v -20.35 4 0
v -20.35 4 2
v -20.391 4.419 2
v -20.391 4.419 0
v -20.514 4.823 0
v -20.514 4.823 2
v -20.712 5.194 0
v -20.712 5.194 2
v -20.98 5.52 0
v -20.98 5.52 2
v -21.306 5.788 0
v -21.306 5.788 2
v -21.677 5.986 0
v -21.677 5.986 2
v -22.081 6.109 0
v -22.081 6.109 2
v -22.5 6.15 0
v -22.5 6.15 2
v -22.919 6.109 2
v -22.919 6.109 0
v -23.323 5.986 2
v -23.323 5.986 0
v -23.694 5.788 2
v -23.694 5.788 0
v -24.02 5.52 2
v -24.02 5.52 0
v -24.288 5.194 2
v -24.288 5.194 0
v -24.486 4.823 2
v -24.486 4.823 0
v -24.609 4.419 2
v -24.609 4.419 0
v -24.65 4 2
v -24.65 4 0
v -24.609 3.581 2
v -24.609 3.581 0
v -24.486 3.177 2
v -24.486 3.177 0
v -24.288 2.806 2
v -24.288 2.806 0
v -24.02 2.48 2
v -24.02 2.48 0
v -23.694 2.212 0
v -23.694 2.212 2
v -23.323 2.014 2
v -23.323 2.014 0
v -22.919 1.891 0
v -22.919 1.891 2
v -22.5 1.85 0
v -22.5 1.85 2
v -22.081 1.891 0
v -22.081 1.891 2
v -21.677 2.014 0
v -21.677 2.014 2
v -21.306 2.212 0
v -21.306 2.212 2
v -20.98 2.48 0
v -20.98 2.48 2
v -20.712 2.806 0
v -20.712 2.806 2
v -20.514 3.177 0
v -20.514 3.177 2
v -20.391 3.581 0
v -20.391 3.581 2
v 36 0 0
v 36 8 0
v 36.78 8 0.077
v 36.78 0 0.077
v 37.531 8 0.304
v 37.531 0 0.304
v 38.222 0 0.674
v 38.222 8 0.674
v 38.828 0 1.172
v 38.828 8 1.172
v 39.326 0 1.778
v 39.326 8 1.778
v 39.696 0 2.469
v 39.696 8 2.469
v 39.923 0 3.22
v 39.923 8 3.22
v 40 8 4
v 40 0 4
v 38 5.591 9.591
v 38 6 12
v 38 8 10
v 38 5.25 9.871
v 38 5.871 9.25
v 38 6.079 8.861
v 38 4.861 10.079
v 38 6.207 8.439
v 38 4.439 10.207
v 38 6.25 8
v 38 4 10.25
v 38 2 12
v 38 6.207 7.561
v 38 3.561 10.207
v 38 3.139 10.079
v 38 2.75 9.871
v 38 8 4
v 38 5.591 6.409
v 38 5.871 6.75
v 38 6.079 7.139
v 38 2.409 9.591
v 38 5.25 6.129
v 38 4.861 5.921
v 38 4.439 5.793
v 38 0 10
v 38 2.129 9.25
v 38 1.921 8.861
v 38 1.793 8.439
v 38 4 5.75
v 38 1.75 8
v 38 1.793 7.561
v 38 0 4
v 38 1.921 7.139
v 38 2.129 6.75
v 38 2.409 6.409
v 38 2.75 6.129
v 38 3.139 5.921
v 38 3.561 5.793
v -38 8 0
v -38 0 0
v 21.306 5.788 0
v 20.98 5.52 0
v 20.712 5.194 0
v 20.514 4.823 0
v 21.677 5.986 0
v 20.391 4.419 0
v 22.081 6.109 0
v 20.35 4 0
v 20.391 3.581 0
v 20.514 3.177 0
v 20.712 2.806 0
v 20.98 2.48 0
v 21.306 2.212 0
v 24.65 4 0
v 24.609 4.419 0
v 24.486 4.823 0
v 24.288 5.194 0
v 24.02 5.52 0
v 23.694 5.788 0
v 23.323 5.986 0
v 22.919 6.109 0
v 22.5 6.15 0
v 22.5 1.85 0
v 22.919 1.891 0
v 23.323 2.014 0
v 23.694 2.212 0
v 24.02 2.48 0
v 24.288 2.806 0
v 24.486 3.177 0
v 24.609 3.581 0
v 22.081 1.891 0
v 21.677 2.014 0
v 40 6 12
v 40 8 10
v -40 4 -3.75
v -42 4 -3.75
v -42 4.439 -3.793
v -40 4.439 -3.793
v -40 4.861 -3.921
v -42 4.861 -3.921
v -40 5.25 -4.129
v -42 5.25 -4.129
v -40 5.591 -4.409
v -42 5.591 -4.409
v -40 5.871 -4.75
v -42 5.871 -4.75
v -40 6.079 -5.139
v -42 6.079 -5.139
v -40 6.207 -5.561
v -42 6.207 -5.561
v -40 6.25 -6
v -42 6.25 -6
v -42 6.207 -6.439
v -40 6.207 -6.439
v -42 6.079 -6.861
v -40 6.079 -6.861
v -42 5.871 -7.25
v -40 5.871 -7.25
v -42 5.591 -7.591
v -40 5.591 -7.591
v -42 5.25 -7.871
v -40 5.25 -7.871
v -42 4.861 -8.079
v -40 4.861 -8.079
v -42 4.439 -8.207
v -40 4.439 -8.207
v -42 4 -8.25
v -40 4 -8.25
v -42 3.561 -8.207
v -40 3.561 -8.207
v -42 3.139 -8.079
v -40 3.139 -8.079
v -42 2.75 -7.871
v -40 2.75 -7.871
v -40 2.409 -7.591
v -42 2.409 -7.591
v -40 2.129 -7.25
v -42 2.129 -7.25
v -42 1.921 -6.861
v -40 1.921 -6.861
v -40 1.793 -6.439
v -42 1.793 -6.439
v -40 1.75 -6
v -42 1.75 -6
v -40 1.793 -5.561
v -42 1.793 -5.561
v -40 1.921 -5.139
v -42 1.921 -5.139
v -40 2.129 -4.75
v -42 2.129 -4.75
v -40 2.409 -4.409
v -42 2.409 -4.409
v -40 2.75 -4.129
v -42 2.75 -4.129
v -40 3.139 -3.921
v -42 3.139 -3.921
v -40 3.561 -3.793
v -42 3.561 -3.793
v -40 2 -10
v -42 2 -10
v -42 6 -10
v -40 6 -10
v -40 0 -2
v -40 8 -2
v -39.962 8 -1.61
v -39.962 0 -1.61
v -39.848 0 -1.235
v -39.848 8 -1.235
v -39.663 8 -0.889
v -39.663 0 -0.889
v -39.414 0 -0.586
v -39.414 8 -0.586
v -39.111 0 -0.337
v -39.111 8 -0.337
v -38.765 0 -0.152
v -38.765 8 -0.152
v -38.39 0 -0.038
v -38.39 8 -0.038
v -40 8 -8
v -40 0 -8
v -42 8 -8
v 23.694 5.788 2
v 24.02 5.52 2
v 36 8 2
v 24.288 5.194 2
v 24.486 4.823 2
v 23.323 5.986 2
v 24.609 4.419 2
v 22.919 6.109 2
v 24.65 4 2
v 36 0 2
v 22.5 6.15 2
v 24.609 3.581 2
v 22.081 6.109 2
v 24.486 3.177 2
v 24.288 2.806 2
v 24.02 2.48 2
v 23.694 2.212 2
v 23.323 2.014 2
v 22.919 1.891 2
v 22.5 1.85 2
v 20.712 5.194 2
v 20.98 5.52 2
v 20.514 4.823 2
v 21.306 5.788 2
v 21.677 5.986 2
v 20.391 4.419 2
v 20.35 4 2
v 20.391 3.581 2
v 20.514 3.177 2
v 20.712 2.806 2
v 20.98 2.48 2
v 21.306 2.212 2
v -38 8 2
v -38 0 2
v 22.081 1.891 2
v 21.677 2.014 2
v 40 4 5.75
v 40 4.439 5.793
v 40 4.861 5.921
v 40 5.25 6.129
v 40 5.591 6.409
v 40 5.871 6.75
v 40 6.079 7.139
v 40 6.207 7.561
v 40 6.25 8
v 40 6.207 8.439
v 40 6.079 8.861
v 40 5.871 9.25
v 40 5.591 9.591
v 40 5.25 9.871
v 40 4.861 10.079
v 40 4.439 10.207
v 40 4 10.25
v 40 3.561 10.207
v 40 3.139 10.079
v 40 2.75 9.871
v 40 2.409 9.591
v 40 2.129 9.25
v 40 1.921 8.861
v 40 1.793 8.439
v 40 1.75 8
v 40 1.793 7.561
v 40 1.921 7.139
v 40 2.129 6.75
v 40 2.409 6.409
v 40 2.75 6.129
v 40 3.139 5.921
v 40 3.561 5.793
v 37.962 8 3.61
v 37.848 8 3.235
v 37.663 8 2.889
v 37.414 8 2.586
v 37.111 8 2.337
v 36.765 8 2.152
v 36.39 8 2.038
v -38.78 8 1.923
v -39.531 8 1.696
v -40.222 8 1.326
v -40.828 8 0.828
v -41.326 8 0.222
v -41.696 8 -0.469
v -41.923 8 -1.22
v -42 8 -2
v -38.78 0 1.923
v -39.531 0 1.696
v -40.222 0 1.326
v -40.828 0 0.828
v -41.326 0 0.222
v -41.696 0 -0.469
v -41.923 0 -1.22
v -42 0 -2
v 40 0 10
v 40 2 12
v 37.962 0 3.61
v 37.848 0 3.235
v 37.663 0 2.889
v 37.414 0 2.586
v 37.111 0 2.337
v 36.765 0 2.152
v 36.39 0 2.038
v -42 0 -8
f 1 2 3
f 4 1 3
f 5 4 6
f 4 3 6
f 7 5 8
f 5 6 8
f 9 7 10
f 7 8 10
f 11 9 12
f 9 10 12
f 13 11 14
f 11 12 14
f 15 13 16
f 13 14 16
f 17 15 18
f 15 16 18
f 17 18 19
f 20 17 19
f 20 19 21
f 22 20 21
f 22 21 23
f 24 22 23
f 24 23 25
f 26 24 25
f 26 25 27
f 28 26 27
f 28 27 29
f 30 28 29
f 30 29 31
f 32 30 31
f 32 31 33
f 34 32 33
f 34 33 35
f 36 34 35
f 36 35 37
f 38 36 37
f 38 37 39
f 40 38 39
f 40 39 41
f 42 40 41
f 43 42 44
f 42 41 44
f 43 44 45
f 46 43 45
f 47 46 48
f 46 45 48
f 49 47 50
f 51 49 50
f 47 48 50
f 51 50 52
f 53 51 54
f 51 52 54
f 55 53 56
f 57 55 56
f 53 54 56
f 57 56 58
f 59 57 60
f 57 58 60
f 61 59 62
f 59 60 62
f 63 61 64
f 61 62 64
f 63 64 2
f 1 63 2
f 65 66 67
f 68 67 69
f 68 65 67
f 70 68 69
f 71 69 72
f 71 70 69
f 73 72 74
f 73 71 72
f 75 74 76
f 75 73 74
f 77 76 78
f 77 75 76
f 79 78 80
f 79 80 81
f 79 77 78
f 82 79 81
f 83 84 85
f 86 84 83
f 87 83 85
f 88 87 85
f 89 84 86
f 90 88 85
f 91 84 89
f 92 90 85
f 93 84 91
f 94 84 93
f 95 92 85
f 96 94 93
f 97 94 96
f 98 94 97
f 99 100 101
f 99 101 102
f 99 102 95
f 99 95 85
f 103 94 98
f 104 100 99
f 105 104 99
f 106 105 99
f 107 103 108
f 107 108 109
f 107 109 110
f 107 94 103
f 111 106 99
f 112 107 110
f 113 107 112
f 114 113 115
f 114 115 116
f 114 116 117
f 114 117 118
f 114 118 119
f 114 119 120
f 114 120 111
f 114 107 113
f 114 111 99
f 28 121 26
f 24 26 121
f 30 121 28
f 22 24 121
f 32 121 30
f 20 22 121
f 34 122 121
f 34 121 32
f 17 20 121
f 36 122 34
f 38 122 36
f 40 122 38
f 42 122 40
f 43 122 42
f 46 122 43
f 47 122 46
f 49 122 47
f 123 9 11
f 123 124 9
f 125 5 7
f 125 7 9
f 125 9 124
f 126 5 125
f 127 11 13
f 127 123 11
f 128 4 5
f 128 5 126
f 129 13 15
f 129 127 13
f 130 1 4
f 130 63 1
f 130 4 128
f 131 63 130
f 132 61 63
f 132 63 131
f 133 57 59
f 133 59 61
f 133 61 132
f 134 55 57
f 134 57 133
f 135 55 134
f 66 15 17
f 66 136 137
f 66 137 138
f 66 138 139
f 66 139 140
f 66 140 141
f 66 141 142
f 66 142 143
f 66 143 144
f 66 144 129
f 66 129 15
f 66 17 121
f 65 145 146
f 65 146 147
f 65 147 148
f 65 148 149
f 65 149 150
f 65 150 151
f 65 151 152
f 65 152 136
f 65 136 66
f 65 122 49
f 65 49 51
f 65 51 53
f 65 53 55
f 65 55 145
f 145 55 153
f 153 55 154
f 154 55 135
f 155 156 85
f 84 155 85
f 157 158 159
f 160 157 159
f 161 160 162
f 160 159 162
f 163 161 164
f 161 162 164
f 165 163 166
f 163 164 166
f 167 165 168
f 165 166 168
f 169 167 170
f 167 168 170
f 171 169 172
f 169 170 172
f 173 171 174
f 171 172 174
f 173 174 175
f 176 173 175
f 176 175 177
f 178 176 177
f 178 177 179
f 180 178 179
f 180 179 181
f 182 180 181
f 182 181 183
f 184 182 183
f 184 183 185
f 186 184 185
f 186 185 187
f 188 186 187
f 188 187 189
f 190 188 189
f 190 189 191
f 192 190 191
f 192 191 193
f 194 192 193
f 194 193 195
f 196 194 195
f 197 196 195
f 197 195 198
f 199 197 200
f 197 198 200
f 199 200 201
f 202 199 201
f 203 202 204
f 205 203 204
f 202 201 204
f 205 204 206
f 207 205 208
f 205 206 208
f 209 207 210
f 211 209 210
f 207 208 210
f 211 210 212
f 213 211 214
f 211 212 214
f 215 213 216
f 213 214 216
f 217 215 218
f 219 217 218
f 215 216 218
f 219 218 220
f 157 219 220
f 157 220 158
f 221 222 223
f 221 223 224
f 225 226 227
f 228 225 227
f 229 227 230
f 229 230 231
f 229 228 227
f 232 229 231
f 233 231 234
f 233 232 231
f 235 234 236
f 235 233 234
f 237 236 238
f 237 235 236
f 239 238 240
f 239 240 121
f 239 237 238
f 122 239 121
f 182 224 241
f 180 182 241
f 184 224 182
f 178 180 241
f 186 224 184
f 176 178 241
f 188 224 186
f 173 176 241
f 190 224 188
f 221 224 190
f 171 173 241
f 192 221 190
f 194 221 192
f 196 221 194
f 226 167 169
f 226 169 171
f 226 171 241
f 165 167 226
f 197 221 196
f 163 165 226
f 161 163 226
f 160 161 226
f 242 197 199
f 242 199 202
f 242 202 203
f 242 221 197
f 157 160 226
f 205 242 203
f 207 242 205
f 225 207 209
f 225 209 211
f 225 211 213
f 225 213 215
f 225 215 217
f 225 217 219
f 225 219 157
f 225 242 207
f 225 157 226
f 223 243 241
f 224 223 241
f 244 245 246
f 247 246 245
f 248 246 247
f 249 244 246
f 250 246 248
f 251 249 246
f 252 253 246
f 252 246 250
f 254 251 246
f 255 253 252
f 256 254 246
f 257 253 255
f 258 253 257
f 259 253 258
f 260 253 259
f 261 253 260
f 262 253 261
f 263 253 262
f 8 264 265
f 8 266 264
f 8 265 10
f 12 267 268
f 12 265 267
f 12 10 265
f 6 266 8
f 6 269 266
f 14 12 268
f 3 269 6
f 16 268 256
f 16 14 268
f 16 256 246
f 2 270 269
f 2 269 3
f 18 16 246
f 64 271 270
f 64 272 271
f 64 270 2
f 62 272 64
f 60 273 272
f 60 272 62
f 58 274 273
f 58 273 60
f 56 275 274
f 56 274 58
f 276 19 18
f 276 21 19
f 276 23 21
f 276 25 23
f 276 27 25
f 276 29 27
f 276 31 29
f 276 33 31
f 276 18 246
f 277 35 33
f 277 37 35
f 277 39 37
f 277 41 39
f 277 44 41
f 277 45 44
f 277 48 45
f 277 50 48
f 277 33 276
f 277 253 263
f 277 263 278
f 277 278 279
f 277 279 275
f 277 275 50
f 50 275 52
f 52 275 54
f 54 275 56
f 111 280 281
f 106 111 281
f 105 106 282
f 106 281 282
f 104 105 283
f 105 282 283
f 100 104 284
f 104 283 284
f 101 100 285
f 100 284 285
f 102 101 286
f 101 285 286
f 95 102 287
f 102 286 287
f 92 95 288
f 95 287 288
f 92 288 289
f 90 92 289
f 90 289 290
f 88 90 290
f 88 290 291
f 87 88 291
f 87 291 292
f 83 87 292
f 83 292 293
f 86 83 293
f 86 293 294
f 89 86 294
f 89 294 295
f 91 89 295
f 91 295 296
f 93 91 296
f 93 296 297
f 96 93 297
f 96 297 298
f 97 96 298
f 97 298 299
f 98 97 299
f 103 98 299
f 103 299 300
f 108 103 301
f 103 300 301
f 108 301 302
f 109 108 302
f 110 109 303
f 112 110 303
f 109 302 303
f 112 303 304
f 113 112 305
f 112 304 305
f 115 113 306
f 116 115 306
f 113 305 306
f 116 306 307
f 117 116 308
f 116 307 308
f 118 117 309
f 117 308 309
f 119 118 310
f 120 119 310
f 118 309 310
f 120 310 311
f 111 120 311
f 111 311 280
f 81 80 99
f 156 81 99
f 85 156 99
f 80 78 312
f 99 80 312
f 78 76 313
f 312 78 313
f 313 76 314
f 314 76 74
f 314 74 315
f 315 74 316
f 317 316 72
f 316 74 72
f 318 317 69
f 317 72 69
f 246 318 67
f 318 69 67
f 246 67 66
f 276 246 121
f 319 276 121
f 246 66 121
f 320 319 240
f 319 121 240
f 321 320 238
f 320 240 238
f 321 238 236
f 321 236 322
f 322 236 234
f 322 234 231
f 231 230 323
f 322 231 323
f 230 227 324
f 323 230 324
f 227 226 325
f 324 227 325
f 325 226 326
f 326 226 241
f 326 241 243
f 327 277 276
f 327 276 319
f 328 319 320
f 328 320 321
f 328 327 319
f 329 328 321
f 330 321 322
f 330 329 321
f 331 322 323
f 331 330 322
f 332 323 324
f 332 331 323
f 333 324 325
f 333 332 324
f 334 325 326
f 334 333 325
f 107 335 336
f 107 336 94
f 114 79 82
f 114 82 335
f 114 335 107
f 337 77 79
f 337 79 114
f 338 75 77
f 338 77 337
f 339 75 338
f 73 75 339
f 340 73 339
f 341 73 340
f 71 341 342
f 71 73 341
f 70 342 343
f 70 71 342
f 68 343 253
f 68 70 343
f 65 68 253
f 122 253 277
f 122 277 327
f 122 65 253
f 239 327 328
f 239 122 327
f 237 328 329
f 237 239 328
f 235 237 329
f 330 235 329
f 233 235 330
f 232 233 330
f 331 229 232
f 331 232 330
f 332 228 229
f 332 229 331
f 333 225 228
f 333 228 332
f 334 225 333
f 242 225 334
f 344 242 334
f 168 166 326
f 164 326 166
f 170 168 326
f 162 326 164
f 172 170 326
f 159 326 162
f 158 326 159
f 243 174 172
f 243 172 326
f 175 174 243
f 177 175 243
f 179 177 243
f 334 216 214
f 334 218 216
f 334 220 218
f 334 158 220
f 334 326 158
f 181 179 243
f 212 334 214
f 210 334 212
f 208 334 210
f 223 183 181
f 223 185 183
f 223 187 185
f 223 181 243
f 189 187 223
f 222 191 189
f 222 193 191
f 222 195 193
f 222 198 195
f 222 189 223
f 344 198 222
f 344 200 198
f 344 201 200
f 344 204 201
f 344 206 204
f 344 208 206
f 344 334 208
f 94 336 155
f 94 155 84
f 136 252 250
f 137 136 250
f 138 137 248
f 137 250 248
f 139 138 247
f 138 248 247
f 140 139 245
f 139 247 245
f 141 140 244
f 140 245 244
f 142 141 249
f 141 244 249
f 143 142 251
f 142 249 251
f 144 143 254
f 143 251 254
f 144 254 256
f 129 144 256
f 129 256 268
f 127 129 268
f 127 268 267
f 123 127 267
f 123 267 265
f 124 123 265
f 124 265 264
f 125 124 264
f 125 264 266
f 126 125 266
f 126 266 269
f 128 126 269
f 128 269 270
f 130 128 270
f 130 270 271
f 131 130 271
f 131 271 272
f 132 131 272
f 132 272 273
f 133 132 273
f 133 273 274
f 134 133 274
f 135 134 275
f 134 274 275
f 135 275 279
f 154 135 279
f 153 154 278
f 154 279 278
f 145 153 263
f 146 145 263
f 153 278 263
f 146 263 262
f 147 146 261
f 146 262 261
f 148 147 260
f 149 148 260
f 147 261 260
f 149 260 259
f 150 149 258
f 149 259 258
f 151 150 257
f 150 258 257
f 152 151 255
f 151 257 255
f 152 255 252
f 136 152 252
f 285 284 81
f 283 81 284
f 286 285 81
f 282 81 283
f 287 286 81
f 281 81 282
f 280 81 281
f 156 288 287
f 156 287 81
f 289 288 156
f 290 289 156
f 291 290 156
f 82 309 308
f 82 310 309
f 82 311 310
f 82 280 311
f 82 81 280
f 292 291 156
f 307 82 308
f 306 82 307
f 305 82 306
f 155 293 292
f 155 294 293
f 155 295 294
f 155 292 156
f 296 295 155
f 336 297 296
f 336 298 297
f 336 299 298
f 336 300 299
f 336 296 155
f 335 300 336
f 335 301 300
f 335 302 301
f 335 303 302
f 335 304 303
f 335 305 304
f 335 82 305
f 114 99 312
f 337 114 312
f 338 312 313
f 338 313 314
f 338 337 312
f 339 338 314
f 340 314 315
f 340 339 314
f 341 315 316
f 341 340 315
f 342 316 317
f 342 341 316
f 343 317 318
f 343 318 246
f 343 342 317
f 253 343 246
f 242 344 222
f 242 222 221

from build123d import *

# Parameters (mm, degrees)
SM_BASE_FLANGE_1_DEPTH = 8
SKETCH_6_R             = 2.15
CUT_EXTRUDE_1_DEPTH    = 45.407206622
CHAMFER_1_SIZE         = 2
SKETCH_7_R             = 2.25
CUT_EXTRUDE_2_DEPTH    = 84.258633186
SKETCH_8_R             = 2.25
CUT_EXTRUDE_3_DEPTH    = 84.258633186


# Sheet-metal steps are written as plain solids
with BuildPart() as part:
    # Sketch 1 → 基体-法兰1 (new body)
    with BuildSketch(Plane(origin=(0, 0, 0), x_dir=(1, 0, 0), z_dir=(0, 1, 0))):
        with BuildLine():
            Line((-40, 10), (-40, 2))
            ThreePointArc((-40, 2), (-39.414213562, 0.585786438), (-38, 0))
            Line((-38, 0), (36, 0))
            ThreePointArc((36, 0), (38.828427125, -1.171572875), (40, -4))
            Line((40, -4), (40, -12))
            Line((40, -12), (38, -12))
            Line((38, -12), (38, -4))
            ThreePointArc((38, -4), (37.414213562, -2.585786438), (36, -2))
            Line((36, -2), (-38, -2))
            ThreePointArc((-38, -2), (-40.828427125, -0.828427125), (-42, 2))
            Line((-42, 2), (-42, 10))
            Line((-42, 10), (-40, 10))
        make_face()
    extrude(amount=SM_BASE_FLANGE_1_DEPTH)

    # 草图6 → 切除-拉伸1 (cut, through all)
    with BuildSketch(Plane.XY.offset(2)):
        with Locations((-22.5, 4)):
            Circle(SKETCH_6_R)
        with Locations((22.5, 4)):
            Circle(SKETCH_6_R)
    extrude(amount=-CUT_EXTRUDE_1_DEPTH, mode=Mode.SUBTRACT)

    # 倒角1
    chamfer_1_edges = [part.edges().sort_by_distance(p)[0] for p in [
        (39, 0, 12),
        (-41, 0, -10),
        (39, 8, 12),
        (-41, 8, -10),
    ]]
    chamfer(chamfer_1_edges, length=CHAMFER_1_SIZE)

    # 草图7 → 切除-拉伸2 (cut, through all)
    with BuildSketch(Plane.ZY.offset(42)):
        with Locations((-6, 4)):
            Circle(SKETCH_7_R)
    extrude(amount=-CUT_EXTRUDE_2_DEPTH, mode=Mode.SUBTRACT)

    # 草图8 → 切除-拉伸3 (cut, through all)
    with BuildSketch(Plane(origin=(40, 0, 0), x_dir=(0, 0, -1), z_dir=(1, 0, 0))):
        with Locations((-8, 4)):
            Circle(SKETCH_8_R)
    extrude(amount=-CUT_EXTRUDE_3_DEPTH, mode=Mode.SUBTRACT)


solid = part.part
